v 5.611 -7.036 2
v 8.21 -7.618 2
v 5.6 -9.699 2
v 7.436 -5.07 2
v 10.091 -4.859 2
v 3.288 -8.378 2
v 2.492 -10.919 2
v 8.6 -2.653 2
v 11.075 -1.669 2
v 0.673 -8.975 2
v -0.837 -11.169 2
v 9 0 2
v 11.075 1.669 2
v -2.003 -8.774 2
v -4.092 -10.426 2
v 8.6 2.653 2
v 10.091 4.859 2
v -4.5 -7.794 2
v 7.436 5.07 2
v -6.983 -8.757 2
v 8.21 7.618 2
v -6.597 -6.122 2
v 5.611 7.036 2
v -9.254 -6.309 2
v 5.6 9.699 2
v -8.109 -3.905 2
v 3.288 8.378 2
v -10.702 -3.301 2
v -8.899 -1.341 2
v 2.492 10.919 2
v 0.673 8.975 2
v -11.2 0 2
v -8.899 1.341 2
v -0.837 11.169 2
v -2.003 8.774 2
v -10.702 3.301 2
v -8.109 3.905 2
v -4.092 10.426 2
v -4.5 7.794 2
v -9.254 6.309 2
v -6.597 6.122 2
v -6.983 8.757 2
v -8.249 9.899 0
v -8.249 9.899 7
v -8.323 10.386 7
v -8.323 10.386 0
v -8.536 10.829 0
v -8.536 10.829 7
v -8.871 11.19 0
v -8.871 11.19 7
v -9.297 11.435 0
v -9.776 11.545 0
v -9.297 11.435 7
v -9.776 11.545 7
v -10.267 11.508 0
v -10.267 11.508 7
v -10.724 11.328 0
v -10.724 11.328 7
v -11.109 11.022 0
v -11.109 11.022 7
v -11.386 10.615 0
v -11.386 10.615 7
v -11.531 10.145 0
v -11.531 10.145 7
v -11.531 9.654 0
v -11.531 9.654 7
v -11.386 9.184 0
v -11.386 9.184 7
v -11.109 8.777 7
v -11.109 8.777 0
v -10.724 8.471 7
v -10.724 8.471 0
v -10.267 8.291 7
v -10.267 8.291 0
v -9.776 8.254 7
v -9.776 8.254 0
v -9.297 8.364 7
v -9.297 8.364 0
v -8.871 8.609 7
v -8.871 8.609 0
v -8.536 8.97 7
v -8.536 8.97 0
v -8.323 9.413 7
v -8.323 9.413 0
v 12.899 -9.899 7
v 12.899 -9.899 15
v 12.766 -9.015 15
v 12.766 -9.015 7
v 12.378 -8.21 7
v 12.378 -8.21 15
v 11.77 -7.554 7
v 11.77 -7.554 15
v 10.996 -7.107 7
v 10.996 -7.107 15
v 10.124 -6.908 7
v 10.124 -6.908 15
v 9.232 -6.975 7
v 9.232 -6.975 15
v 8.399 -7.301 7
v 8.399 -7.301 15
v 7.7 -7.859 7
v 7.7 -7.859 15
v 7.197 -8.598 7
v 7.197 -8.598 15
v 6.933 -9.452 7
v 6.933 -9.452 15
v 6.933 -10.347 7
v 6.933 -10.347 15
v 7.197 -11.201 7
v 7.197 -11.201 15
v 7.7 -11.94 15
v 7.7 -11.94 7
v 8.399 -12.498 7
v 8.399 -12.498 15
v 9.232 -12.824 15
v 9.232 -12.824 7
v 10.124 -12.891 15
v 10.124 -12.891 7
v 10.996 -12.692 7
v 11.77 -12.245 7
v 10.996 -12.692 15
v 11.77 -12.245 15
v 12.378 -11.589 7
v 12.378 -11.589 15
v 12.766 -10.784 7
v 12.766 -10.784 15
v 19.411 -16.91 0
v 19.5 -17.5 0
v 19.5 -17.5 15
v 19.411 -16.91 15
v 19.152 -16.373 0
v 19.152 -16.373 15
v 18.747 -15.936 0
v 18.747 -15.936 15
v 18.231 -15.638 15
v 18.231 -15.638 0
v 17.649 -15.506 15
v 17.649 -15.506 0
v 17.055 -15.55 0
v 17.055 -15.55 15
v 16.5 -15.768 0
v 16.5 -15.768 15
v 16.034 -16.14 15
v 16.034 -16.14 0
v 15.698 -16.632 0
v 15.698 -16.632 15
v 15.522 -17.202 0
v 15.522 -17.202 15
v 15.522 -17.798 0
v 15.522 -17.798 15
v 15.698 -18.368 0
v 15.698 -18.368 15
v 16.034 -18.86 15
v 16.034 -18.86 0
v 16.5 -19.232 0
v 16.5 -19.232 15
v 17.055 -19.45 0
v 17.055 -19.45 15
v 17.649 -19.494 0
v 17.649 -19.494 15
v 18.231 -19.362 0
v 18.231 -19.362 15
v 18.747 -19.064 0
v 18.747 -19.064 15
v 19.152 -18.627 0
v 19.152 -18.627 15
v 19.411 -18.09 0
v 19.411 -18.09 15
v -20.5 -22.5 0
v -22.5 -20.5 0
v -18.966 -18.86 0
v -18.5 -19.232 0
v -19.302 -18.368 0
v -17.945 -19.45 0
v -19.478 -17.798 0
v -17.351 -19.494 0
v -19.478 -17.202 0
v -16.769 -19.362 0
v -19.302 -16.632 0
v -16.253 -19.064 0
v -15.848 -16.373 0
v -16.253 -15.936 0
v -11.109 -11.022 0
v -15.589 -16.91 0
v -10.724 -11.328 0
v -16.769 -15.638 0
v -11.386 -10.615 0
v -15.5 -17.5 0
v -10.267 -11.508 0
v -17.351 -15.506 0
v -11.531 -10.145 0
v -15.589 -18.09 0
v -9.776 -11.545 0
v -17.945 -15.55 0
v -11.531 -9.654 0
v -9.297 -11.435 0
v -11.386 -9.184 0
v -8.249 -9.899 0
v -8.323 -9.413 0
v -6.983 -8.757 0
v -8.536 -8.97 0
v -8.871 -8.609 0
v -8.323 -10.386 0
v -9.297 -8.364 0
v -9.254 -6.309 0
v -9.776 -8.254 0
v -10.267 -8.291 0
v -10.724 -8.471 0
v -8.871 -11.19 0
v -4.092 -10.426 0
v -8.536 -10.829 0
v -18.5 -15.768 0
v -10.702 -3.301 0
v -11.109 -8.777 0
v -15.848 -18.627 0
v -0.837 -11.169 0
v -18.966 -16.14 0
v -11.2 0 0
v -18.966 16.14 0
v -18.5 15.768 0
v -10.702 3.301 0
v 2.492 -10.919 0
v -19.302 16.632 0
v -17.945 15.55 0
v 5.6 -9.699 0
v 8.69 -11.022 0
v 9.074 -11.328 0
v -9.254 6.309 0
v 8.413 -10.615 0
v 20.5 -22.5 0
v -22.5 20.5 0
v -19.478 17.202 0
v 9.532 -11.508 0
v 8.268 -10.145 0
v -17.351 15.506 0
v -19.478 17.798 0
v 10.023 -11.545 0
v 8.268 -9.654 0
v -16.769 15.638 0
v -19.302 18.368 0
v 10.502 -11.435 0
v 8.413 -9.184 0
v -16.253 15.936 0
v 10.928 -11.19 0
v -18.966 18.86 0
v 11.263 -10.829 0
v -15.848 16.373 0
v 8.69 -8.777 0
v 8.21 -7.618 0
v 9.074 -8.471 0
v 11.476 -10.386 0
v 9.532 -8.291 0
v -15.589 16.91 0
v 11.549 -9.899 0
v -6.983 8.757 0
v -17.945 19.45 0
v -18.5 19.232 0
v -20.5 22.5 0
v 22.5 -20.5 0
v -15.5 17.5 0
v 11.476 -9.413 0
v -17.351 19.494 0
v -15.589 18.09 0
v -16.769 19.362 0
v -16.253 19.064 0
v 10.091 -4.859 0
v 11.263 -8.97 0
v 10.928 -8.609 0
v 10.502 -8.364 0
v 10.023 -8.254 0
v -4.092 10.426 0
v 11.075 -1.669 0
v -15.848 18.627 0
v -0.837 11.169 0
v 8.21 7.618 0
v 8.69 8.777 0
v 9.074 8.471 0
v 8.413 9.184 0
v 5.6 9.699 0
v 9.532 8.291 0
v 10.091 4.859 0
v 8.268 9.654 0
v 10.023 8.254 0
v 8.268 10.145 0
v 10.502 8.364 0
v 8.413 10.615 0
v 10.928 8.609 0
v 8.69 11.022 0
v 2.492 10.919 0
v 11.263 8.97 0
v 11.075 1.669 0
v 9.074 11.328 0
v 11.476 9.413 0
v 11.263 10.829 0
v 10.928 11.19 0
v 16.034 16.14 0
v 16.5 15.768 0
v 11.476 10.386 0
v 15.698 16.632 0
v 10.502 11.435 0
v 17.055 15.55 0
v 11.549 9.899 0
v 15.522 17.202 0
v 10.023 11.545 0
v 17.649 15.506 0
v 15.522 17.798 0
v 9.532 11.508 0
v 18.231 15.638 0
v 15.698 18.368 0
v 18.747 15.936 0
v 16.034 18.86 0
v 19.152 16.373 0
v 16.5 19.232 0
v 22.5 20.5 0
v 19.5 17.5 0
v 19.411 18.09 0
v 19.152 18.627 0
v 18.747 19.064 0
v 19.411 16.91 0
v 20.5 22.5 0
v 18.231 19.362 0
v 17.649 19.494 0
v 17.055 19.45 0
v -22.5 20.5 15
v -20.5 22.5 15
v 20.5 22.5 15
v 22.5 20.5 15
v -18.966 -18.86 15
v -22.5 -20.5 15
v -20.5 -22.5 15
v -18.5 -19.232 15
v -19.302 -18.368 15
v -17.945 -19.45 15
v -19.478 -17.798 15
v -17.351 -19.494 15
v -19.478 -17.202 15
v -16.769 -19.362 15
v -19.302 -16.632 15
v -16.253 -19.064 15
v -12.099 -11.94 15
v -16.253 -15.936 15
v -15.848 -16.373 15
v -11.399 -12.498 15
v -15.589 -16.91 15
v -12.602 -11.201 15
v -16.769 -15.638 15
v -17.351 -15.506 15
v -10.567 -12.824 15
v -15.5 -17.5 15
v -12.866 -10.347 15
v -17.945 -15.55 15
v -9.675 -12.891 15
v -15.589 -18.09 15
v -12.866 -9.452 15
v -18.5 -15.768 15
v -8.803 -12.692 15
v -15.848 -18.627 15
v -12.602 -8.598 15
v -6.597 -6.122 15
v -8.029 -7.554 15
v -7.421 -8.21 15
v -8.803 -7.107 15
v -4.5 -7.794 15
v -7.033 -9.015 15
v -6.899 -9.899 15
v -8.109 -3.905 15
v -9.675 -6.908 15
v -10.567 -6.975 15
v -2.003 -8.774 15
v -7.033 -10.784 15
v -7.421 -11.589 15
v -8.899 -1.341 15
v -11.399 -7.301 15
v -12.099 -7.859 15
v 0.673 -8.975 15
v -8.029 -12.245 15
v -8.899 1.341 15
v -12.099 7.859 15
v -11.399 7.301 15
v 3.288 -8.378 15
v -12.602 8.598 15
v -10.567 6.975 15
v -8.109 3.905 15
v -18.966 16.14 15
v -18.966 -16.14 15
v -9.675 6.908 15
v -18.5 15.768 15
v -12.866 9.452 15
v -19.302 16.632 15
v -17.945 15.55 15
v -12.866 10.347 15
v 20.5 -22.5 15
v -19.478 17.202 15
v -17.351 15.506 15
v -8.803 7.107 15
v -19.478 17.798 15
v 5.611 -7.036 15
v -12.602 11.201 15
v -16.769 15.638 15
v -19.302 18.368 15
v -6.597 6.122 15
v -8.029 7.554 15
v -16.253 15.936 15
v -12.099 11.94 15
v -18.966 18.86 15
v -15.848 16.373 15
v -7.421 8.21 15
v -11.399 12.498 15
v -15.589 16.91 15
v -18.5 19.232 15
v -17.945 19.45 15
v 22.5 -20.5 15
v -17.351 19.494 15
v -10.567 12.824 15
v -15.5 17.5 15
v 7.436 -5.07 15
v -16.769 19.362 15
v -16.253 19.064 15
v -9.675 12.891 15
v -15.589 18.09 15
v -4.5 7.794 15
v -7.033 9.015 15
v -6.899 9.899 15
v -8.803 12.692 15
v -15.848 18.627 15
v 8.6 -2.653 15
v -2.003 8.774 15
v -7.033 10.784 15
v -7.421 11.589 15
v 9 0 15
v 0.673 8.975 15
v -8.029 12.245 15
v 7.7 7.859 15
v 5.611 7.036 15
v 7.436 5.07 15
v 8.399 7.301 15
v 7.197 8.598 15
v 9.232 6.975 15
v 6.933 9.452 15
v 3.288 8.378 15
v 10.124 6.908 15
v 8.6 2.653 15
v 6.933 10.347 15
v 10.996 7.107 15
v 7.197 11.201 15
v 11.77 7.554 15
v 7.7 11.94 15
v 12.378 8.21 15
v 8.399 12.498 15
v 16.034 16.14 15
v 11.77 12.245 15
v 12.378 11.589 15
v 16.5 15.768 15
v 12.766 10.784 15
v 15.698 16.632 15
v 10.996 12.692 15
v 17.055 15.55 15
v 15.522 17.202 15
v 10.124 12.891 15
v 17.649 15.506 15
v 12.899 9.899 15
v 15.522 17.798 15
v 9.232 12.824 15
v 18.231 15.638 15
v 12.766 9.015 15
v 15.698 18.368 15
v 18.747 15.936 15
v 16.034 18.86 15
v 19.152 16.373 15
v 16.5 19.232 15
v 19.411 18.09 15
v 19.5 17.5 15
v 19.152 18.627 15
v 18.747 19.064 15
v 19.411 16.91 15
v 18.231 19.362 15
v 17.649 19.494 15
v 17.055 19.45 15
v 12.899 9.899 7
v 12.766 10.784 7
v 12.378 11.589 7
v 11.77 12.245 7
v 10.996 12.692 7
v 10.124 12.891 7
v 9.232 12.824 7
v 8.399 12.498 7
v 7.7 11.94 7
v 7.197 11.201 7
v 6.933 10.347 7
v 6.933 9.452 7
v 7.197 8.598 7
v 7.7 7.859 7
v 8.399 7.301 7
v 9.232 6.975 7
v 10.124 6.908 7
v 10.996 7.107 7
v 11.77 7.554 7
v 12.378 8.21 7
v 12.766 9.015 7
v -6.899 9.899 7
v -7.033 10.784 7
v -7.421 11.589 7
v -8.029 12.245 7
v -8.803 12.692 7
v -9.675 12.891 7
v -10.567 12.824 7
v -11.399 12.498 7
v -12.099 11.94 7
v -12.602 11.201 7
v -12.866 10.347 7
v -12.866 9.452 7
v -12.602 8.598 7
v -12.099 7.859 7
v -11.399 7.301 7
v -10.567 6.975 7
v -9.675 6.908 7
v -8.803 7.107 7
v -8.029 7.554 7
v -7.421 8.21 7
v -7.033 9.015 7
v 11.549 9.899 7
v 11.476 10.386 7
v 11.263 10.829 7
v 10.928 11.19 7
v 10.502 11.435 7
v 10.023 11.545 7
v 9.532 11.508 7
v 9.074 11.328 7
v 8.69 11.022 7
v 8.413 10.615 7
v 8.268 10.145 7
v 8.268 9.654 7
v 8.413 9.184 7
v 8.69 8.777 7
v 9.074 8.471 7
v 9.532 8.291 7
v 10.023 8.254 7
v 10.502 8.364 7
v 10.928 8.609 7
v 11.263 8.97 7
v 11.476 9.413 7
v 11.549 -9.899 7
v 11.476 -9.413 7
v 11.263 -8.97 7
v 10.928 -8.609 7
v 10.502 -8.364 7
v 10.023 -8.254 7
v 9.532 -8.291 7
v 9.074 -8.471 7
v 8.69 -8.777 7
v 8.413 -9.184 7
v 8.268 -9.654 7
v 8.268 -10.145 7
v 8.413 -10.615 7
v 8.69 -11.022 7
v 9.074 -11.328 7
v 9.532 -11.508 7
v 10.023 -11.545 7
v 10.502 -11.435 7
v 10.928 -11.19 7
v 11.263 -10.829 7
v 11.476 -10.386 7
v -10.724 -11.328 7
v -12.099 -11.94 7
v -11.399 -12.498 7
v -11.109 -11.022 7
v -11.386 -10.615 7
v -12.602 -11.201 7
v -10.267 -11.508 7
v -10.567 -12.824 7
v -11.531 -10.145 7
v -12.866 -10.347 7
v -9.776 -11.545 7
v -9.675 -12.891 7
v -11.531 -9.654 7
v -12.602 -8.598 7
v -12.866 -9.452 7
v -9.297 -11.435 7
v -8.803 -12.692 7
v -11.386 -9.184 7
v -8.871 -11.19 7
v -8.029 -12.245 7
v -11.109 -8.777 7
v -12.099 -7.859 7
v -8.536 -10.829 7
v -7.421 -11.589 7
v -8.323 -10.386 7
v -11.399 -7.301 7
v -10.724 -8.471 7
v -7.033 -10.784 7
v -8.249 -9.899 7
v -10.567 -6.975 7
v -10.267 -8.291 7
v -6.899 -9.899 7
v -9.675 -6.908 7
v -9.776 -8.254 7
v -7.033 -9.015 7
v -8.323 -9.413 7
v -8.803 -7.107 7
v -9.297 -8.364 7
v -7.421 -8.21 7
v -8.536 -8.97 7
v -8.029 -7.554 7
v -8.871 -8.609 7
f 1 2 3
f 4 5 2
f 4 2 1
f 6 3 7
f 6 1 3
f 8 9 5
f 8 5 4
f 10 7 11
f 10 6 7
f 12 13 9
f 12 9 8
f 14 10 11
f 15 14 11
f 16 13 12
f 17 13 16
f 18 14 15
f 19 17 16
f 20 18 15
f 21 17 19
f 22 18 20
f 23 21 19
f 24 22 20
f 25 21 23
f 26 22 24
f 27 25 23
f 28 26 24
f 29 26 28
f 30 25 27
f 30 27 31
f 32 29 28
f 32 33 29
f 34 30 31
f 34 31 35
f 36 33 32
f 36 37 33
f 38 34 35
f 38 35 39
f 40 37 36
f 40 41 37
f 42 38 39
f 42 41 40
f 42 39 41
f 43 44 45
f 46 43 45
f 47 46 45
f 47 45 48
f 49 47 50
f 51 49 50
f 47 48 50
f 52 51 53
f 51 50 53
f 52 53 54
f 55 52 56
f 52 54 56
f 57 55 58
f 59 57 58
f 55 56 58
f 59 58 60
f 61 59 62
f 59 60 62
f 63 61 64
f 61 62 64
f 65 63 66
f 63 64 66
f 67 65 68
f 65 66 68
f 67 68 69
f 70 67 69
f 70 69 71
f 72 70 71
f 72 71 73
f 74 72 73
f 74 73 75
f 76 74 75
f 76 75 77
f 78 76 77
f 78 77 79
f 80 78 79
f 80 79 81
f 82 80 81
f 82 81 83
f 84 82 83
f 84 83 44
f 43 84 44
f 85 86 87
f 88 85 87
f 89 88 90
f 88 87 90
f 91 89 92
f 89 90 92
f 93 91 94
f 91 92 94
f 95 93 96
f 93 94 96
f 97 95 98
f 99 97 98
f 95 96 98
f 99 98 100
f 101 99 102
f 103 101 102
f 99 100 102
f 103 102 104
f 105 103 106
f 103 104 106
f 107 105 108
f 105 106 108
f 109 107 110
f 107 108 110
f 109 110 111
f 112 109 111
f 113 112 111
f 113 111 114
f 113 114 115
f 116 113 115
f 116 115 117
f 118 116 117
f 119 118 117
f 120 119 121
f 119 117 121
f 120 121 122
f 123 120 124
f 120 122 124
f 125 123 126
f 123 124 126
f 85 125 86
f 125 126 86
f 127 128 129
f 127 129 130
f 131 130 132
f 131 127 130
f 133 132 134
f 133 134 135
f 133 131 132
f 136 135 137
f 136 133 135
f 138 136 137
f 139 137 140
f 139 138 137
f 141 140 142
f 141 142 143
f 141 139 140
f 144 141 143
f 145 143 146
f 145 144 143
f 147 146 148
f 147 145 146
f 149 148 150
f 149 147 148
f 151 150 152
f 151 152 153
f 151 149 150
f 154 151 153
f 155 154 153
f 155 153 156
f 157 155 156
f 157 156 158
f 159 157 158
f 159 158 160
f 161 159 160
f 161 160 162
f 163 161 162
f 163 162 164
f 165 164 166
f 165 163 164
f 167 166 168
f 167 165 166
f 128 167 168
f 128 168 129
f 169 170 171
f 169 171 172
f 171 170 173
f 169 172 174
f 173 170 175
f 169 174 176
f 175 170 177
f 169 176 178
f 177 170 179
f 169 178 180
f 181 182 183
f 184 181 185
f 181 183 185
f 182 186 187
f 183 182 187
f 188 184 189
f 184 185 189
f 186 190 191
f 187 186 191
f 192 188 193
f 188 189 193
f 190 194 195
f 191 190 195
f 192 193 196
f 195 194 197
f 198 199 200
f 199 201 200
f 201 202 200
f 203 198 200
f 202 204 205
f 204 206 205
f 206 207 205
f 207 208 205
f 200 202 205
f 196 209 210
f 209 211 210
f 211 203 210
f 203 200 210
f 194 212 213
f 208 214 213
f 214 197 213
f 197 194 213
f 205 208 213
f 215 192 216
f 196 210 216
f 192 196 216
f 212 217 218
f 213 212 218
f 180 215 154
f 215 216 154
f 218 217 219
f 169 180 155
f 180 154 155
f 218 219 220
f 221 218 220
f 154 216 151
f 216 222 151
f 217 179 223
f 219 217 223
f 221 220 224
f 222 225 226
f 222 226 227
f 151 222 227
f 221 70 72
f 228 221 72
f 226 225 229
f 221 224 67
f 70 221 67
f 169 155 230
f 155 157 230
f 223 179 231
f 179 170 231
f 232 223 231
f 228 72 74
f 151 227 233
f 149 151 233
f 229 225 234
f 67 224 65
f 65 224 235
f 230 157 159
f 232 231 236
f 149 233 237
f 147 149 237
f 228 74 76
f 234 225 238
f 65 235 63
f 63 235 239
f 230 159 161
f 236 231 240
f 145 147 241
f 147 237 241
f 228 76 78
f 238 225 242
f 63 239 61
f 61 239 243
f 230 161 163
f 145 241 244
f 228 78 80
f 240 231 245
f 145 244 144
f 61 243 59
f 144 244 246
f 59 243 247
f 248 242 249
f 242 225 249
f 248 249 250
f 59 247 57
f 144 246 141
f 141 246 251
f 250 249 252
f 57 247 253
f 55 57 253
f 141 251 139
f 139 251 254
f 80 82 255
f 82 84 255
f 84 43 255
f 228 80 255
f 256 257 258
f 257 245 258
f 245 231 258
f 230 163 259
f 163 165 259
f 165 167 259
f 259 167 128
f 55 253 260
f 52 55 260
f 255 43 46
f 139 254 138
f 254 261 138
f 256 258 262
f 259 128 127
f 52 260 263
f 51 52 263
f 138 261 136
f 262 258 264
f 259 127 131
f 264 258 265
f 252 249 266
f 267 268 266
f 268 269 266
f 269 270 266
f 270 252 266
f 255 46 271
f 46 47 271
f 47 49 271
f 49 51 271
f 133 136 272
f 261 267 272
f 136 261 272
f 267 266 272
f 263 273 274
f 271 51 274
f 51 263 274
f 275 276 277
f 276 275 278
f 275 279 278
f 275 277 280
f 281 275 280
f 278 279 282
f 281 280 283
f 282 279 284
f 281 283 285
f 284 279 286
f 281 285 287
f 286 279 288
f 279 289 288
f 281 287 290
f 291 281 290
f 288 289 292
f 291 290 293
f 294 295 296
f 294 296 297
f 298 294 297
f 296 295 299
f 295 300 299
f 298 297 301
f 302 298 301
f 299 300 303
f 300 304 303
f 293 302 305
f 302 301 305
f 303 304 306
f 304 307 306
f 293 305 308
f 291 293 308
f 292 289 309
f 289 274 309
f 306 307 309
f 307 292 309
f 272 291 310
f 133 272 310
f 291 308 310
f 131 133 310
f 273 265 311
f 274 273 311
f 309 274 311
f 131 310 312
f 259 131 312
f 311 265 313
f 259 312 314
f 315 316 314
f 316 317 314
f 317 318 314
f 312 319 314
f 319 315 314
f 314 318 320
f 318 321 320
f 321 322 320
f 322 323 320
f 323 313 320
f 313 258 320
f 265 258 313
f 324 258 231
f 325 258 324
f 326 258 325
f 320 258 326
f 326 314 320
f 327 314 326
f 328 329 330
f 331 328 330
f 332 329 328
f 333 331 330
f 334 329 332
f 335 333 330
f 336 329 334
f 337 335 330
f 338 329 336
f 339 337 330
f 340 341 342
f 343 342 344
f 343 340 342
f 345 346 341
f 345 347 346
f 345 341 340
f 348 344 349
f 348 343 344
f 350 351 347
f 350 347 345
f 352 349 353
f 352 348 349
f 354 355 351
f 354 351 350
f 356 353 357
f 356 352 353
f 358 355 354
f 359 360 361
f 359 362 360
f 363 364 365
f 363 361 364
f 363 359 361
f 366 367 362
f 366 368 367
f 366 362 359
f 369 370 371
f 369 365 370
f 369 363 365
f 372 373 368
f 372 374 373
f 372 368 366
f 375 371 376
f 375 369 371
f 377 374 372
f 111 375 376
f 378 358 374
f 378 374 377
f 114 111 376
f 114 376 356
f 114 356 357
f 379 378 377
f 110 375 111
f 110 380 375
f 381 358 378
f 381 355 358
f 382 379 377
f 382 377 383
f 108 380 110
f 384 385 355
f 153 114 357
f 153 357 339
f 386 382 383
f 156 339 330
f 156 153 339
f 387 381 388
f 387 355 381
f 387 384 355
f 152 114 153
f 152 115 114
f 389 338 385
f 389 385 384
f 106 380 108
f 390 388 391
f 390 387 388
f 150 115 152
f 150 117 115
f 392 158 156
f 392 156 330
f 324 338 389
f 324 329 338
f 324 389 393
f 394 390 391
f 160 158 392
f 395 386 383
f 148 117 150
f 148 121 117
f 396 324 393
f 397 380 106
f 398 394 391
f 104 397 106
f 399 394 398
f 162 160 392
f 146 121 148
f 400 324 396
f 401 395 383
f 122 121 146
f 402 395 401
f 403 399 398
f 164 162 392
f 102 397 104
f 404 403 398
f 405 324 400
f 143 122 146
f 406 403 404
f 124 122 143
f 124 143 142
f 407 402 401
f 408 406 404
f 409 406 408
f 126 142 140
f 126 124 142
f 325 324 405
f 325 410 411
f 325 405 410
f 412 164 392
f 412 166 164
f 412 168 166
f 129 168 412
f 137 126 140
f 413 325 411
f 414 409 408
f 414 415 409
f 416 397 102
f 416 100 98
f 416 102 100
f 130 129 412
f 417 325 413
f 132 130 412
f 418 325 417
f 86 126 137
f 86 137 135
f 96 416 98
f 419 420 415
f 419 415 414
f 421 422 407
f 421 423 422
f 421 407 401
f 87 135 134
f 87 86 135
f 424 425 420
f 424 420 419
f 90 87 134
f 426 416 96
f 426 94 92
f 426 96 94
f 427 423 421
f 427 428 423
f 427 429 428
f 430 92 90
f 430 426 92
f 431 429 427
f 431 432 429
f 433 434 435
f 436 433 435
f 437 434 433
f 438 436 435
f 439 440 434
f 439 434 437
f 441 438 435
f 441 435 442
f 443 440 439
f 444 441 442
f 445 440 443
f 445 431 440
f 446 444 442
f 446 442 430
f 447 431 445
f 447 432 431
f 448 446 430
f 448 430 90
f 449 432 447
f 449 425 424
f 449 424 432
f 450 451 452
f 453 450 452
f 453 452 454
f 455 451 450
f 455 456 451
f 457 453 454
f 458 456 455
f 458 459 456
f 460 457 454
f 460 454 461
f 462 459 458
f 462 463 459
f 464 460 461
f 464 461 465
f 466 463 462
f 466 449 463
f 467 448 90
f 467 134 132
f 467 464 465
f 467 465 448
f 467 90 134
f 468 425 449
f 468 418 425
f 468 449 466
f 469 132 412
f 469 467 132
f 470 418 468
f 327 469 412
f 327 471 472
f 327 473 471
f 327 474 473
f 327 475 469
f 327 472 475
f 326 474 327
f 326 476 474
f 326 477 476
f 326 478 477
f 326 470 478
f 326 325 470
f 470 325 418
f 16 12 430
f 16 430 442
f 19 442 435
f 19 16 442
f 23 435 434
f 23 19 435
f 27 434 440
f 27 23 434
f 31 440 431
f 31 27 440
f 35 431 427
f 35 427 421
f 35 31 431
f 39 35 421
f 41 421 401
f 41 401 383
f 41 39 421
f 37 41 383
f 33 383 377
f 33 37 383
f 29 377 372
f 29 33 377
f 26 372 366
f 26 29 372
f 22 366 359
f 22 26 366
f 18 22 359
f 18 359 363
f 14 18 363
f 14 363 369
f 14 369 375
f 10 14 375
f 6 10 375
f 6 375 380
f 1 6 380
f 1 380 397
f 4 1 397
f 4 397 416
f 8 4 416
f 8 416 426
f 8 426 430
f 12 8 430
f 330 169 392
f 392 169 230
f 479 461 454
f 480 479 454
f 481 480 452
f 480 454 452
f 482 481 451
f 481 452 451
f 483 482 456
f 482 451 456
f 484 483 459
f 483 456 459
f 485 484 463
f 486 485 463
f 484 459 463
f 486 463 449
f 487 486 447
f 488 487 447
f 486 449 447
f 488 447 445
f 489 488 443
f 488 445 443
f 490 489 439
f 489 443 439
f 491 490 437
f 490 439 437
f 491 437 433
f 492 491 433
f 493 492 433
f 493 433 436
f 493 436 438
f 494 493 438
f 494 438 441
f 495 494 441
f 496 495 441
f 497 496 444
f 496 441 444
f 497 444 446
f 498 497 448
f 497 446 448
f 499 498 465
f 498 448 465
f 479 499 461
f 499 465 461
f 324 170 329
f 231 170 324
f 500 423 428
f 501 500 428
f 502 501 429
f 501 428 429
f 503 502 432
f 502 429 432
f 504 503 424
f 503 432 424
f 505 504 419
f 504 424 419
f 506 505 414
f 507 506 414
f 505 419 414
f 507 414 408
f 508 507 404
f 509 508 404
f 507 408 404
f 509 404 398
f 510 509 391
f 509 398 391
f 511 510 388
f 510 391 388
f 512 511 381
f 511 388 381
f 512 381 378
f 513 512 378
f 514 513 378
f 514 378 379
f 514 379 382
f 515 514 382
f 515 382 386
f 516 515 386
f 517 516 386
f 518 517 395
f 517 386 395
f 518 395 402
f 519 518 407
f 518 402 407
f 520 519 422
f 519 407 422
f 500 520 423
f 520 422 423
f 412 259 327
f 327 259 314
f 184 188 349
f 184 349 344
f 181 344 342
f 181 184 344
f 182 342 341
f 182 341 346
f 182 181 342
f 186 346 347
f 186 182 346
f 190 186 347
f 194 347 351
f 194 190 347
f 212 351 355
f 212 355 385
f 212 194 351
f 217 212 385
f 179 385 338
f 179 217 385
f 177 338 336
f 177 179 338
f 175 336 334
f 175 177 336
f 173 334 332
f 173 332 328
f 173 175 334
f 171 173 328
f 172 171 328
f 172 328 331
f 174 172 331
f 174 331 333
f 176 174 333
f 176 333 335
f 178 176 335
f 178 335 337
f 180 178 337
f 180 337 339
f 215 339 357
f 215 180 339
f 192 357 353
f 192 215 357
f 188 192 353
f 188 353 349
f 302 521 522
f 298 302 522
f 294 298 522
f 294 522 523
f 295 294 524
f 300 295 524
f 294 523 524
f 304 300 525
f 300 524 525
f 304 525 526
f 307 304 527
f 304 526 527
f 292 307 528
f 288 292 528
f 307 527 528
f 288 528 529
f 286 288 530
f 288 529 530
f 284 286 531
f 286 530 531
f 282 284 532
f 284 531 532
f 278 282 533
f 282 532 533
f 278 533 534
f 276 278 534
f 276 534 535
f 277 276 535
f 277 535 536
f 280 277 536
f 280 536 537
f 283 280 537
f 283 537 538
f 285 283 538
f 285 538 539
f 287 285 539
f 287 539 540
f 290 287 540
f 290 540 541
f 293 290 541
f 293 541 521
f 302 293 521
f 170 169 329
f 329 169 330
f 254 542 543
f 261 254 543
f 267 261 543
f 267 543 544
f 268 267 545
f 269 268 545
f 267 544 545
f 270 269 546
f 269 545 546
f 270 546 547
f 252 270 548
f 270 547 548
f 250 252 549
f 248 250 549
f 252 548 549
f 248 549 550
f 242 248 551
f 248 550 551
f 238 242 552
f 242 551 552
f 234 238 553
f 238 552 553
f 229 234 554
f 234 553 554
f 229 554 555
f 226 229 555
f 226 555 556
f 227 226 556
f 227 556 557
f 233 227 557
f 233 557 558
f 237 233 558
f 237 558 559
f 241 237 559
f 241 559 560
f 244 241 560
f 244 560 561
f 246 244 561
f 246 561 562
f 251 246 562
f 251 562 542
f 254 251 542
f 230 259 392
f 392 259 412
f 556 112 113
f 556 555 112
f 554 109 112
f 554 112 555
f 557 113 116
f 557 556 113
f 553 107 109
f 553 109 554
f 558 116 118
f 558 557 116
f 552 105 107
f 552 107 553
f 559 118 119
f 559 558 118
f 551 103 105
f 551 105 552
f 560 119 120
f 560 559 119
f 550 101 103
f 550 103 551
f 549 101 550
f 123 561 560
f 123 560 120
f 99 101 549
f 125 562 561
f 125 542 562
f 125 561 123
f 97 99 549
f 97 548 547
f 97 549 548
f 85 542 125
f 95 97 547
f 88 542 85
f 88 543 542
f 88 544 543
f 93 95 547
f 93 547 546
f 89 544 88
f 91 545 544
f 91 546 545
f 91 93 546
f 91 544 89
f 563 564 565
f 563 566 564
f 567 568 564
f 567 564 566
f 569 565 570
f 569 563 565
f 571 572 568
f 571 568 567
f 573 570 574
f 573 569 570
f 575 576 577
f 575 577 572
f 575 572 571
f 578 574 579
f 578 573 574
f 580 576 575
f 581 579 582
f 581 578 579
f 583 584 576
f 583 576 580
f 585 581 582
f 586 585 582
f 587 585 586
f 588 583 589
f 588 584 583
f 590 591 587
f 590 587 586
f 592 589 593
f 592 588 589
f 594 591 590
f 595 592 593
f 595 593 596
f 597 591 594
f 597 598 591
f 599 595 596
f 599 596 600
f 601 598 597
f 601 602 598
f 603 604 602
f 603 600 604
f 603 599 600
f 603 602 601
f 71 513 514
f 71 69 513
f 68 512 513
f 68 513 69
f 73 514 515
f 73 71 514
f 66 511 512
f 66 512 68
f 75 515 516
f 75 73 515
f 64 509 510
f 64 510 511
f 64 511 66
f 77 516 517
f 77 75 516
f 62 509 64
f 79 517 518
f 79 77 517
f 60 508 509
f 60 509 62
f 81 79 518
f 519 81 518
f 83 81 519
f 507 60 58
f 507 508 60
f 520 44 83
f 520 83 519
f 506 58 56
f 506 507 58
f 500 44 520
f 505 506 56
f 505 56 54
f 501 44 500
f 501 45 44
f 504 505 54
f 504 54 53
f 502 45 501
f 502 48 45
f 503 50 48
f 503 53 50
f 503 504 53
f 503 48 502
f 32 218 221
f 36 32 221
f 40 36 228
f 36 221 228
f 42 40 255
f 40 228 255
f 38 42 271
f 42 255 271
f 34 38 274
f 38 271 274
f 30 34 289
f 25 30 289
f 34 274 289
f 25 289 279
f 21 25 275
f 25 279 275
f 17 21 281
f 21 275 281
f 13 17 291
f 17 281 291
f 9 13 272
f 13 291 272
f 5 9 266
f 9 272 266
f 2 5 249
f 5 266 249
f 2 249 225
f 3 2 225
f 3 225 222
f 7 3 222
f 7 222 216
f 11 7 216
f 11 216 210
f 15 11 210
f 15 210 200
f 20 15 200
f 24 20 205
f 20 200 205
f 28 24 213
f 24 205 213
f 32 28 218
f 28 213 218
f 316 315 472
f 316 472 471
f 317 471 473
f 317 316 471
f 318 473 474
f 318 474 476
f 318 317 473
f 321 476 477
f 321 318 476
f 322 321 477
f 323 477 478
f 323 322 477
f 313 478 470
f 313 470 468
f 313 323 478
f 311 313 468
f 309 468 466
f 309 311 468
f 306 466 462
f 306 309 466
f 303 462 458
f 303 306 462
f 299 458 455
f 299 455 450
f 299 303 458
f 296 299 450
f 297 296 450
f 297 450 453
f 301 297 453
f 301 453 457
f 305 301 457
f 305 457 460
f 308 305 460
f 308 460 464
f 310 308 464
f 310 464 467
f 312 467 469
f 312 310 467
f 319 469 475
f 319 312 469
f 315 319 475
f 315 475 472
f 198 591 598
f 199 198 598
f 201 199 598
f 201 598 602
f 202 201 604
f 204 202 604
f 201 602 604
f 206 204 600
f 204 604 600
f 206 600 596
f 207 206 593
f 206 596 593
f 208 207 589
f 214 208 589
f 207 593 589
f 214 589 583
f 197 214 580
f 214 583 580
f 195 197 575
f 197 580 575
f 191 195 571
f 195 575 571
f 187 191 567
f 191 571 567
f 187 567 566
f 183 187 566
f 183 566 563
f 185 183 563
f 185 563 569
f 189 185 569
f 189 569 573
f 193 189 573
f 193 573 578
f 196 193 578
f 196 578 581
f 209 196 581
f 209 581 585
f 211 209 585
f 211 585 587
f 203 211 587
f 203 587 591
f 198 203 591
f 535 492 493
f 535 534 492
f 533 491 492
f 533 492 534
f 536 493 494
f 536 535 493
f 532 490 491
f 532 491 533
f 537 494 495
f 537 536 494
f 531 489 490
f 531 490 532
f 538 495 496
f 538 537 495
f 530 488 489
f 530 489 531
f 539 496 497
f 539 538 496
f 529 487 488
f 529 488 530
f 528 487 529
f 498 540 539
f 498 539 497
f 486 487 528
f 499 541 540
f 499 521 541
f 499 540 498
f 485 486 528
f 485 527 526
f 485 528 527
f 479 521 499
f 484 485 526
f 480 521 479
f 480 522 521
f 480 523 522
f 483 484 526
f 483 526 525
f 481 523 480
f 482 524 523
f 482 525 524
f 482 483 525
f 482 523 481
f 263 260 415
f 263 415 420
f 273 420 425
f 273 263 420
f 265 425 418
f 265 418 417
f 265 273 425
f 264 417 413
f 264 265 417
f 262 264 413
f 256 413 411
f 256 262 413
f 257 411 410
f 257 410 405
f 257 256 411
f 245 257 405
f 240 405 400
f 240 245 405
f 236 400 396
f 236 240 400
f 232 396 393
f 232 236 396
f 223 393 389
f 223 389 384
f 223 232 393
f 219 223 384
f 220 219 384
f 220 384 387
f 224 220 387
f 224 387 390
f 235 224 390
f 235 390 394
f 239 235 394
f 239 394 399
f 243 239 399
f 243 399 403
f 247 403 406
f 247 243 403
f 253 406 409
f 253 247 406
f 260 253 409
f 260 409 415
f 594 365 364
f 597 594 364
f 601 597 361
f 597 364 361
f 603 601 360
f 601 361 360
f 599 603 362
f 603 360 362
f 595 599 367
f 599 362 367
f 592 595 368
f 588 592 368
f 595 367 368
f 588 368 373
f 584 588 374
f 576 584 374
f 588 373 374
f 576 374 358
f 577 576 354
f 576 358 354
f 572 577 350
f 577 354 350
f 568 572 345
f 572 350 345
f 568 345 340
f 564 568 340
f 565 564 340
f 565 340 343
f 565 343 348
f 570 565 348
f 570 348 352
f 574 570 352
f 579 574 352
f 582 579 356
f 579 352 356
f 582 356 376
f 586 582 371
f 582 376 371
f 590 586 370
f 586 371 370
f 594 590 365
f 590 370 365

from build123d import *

# Parameters (mm, degrees)
SKETCH1_W           = 45
SKETCH1_H           = 45
SKETCH1_R           = 9
SKETCH1_R_2         = 2
BOSS_EXTRUDE1_DEPTH = 15
SKETCH2_R           = 1.65
CUT_EXTRUDE1_DEPTH  = 15
SKETCH3_R           = 3
CUT_EXTRUDE2_DEPTH  = 8
CHAMFER1_SIZE       = 2
SKETCH4_R           = 11.2
CUT_EXTRUDE3_DEPTH  = 2


with BuildPart() as part:
    # Sketch1 → Boss-Extrude1 (new body)
    with BuildSketch(Plane.XY):
        Rectangle(SKETCH1_W, SKETCH1_H)
        Circle(SKETCH1_R, mode=Mode.SUBTRACT)
        with Locations((-17.5, 17.5)):
            Circle(SKETCH1_R_2, mode=Mode.SUBTRACT)
        with Locations((17.5, 17.5)):
            Circle(SKETCH1_R_2, mode=Mode.SUBTRACT)
        with Locations((17.5, -17.5)):
            Circle(SKETCH1_R_2, mode=Mode.SUBTRACT)
        with Locations((-17.5, -17.5)):
            Circle(SKETCH1_R_2, mode=Mode.SUBTRACT)
    extrude(amount=BOSS_EXTRUDE1_DEPTH)

    # Sketch2 → Cut-Extrude1 (cut)
    with BuildSketch(Plane.XY.offset(15)):
        with Locations((9.899494937, 9.899494937)):
            Circle(SKETCH2_R)
        with Locations((9.899494937, -9.899494937)):
            Circle(SKETCH2_R)
        with Locations((-9.899494937, -9.899494937)):
            Circle(SKETCH2_R)
        with Locations((-9.899494937, 9.899494937)):
            Circle(SKETCH2_R)
    extrude(amount=-CUT_EXTRUDE1_DEPTH, mode=Mode.SUBTRACT)

    # Sketch3 → Cut-Extrude2 (cut)
    with BuildSketch(Plane.XY.offset(15)):
        with Locations((9.899494937, 9.899494937)):
            Circle(SKETCH3_R)
        with Locations((9.899494937, -9.899494937)):
            Circle(SKETCH3_R)
        with Locations((-9.899494937, -9.899494937)):
            Circle(SKETCH3_R)
        with Locations((-9.899494937, 9.899494937)):
            Circle(SKETCH3_R)
    extrude(amount=-CUT_EXTRUDE2_DEPTH, mode=Mode.SUBTRACT)

    # Chamfer1
    chamfer1_edges = [part.edges().sort_by_distance(p)[0] for p in [
        (22.5, -22.5, 7.5),
        (-22.5, -22.5, 7.5),
        (-22.5, 22.5, 7.5),
        (22.5, 22.5, 7.5),
    ]]
    chamfer(chamfer1_edges, length=CHAMFER1_SIZE)

    # Sketch4 → Cut-Extrude3 (cut)
    with BuildSketch(Plane(origin=(0, 0, 0), x_dir=(-1, 0, 0), z_dir=(0, 0, -1))):
        Circle(SKETCH4_R)
    extrude(amount=-CUT_EXTRUDE3_DEPTH, mode=Mode.SUBTRACT)


solid = part.part
